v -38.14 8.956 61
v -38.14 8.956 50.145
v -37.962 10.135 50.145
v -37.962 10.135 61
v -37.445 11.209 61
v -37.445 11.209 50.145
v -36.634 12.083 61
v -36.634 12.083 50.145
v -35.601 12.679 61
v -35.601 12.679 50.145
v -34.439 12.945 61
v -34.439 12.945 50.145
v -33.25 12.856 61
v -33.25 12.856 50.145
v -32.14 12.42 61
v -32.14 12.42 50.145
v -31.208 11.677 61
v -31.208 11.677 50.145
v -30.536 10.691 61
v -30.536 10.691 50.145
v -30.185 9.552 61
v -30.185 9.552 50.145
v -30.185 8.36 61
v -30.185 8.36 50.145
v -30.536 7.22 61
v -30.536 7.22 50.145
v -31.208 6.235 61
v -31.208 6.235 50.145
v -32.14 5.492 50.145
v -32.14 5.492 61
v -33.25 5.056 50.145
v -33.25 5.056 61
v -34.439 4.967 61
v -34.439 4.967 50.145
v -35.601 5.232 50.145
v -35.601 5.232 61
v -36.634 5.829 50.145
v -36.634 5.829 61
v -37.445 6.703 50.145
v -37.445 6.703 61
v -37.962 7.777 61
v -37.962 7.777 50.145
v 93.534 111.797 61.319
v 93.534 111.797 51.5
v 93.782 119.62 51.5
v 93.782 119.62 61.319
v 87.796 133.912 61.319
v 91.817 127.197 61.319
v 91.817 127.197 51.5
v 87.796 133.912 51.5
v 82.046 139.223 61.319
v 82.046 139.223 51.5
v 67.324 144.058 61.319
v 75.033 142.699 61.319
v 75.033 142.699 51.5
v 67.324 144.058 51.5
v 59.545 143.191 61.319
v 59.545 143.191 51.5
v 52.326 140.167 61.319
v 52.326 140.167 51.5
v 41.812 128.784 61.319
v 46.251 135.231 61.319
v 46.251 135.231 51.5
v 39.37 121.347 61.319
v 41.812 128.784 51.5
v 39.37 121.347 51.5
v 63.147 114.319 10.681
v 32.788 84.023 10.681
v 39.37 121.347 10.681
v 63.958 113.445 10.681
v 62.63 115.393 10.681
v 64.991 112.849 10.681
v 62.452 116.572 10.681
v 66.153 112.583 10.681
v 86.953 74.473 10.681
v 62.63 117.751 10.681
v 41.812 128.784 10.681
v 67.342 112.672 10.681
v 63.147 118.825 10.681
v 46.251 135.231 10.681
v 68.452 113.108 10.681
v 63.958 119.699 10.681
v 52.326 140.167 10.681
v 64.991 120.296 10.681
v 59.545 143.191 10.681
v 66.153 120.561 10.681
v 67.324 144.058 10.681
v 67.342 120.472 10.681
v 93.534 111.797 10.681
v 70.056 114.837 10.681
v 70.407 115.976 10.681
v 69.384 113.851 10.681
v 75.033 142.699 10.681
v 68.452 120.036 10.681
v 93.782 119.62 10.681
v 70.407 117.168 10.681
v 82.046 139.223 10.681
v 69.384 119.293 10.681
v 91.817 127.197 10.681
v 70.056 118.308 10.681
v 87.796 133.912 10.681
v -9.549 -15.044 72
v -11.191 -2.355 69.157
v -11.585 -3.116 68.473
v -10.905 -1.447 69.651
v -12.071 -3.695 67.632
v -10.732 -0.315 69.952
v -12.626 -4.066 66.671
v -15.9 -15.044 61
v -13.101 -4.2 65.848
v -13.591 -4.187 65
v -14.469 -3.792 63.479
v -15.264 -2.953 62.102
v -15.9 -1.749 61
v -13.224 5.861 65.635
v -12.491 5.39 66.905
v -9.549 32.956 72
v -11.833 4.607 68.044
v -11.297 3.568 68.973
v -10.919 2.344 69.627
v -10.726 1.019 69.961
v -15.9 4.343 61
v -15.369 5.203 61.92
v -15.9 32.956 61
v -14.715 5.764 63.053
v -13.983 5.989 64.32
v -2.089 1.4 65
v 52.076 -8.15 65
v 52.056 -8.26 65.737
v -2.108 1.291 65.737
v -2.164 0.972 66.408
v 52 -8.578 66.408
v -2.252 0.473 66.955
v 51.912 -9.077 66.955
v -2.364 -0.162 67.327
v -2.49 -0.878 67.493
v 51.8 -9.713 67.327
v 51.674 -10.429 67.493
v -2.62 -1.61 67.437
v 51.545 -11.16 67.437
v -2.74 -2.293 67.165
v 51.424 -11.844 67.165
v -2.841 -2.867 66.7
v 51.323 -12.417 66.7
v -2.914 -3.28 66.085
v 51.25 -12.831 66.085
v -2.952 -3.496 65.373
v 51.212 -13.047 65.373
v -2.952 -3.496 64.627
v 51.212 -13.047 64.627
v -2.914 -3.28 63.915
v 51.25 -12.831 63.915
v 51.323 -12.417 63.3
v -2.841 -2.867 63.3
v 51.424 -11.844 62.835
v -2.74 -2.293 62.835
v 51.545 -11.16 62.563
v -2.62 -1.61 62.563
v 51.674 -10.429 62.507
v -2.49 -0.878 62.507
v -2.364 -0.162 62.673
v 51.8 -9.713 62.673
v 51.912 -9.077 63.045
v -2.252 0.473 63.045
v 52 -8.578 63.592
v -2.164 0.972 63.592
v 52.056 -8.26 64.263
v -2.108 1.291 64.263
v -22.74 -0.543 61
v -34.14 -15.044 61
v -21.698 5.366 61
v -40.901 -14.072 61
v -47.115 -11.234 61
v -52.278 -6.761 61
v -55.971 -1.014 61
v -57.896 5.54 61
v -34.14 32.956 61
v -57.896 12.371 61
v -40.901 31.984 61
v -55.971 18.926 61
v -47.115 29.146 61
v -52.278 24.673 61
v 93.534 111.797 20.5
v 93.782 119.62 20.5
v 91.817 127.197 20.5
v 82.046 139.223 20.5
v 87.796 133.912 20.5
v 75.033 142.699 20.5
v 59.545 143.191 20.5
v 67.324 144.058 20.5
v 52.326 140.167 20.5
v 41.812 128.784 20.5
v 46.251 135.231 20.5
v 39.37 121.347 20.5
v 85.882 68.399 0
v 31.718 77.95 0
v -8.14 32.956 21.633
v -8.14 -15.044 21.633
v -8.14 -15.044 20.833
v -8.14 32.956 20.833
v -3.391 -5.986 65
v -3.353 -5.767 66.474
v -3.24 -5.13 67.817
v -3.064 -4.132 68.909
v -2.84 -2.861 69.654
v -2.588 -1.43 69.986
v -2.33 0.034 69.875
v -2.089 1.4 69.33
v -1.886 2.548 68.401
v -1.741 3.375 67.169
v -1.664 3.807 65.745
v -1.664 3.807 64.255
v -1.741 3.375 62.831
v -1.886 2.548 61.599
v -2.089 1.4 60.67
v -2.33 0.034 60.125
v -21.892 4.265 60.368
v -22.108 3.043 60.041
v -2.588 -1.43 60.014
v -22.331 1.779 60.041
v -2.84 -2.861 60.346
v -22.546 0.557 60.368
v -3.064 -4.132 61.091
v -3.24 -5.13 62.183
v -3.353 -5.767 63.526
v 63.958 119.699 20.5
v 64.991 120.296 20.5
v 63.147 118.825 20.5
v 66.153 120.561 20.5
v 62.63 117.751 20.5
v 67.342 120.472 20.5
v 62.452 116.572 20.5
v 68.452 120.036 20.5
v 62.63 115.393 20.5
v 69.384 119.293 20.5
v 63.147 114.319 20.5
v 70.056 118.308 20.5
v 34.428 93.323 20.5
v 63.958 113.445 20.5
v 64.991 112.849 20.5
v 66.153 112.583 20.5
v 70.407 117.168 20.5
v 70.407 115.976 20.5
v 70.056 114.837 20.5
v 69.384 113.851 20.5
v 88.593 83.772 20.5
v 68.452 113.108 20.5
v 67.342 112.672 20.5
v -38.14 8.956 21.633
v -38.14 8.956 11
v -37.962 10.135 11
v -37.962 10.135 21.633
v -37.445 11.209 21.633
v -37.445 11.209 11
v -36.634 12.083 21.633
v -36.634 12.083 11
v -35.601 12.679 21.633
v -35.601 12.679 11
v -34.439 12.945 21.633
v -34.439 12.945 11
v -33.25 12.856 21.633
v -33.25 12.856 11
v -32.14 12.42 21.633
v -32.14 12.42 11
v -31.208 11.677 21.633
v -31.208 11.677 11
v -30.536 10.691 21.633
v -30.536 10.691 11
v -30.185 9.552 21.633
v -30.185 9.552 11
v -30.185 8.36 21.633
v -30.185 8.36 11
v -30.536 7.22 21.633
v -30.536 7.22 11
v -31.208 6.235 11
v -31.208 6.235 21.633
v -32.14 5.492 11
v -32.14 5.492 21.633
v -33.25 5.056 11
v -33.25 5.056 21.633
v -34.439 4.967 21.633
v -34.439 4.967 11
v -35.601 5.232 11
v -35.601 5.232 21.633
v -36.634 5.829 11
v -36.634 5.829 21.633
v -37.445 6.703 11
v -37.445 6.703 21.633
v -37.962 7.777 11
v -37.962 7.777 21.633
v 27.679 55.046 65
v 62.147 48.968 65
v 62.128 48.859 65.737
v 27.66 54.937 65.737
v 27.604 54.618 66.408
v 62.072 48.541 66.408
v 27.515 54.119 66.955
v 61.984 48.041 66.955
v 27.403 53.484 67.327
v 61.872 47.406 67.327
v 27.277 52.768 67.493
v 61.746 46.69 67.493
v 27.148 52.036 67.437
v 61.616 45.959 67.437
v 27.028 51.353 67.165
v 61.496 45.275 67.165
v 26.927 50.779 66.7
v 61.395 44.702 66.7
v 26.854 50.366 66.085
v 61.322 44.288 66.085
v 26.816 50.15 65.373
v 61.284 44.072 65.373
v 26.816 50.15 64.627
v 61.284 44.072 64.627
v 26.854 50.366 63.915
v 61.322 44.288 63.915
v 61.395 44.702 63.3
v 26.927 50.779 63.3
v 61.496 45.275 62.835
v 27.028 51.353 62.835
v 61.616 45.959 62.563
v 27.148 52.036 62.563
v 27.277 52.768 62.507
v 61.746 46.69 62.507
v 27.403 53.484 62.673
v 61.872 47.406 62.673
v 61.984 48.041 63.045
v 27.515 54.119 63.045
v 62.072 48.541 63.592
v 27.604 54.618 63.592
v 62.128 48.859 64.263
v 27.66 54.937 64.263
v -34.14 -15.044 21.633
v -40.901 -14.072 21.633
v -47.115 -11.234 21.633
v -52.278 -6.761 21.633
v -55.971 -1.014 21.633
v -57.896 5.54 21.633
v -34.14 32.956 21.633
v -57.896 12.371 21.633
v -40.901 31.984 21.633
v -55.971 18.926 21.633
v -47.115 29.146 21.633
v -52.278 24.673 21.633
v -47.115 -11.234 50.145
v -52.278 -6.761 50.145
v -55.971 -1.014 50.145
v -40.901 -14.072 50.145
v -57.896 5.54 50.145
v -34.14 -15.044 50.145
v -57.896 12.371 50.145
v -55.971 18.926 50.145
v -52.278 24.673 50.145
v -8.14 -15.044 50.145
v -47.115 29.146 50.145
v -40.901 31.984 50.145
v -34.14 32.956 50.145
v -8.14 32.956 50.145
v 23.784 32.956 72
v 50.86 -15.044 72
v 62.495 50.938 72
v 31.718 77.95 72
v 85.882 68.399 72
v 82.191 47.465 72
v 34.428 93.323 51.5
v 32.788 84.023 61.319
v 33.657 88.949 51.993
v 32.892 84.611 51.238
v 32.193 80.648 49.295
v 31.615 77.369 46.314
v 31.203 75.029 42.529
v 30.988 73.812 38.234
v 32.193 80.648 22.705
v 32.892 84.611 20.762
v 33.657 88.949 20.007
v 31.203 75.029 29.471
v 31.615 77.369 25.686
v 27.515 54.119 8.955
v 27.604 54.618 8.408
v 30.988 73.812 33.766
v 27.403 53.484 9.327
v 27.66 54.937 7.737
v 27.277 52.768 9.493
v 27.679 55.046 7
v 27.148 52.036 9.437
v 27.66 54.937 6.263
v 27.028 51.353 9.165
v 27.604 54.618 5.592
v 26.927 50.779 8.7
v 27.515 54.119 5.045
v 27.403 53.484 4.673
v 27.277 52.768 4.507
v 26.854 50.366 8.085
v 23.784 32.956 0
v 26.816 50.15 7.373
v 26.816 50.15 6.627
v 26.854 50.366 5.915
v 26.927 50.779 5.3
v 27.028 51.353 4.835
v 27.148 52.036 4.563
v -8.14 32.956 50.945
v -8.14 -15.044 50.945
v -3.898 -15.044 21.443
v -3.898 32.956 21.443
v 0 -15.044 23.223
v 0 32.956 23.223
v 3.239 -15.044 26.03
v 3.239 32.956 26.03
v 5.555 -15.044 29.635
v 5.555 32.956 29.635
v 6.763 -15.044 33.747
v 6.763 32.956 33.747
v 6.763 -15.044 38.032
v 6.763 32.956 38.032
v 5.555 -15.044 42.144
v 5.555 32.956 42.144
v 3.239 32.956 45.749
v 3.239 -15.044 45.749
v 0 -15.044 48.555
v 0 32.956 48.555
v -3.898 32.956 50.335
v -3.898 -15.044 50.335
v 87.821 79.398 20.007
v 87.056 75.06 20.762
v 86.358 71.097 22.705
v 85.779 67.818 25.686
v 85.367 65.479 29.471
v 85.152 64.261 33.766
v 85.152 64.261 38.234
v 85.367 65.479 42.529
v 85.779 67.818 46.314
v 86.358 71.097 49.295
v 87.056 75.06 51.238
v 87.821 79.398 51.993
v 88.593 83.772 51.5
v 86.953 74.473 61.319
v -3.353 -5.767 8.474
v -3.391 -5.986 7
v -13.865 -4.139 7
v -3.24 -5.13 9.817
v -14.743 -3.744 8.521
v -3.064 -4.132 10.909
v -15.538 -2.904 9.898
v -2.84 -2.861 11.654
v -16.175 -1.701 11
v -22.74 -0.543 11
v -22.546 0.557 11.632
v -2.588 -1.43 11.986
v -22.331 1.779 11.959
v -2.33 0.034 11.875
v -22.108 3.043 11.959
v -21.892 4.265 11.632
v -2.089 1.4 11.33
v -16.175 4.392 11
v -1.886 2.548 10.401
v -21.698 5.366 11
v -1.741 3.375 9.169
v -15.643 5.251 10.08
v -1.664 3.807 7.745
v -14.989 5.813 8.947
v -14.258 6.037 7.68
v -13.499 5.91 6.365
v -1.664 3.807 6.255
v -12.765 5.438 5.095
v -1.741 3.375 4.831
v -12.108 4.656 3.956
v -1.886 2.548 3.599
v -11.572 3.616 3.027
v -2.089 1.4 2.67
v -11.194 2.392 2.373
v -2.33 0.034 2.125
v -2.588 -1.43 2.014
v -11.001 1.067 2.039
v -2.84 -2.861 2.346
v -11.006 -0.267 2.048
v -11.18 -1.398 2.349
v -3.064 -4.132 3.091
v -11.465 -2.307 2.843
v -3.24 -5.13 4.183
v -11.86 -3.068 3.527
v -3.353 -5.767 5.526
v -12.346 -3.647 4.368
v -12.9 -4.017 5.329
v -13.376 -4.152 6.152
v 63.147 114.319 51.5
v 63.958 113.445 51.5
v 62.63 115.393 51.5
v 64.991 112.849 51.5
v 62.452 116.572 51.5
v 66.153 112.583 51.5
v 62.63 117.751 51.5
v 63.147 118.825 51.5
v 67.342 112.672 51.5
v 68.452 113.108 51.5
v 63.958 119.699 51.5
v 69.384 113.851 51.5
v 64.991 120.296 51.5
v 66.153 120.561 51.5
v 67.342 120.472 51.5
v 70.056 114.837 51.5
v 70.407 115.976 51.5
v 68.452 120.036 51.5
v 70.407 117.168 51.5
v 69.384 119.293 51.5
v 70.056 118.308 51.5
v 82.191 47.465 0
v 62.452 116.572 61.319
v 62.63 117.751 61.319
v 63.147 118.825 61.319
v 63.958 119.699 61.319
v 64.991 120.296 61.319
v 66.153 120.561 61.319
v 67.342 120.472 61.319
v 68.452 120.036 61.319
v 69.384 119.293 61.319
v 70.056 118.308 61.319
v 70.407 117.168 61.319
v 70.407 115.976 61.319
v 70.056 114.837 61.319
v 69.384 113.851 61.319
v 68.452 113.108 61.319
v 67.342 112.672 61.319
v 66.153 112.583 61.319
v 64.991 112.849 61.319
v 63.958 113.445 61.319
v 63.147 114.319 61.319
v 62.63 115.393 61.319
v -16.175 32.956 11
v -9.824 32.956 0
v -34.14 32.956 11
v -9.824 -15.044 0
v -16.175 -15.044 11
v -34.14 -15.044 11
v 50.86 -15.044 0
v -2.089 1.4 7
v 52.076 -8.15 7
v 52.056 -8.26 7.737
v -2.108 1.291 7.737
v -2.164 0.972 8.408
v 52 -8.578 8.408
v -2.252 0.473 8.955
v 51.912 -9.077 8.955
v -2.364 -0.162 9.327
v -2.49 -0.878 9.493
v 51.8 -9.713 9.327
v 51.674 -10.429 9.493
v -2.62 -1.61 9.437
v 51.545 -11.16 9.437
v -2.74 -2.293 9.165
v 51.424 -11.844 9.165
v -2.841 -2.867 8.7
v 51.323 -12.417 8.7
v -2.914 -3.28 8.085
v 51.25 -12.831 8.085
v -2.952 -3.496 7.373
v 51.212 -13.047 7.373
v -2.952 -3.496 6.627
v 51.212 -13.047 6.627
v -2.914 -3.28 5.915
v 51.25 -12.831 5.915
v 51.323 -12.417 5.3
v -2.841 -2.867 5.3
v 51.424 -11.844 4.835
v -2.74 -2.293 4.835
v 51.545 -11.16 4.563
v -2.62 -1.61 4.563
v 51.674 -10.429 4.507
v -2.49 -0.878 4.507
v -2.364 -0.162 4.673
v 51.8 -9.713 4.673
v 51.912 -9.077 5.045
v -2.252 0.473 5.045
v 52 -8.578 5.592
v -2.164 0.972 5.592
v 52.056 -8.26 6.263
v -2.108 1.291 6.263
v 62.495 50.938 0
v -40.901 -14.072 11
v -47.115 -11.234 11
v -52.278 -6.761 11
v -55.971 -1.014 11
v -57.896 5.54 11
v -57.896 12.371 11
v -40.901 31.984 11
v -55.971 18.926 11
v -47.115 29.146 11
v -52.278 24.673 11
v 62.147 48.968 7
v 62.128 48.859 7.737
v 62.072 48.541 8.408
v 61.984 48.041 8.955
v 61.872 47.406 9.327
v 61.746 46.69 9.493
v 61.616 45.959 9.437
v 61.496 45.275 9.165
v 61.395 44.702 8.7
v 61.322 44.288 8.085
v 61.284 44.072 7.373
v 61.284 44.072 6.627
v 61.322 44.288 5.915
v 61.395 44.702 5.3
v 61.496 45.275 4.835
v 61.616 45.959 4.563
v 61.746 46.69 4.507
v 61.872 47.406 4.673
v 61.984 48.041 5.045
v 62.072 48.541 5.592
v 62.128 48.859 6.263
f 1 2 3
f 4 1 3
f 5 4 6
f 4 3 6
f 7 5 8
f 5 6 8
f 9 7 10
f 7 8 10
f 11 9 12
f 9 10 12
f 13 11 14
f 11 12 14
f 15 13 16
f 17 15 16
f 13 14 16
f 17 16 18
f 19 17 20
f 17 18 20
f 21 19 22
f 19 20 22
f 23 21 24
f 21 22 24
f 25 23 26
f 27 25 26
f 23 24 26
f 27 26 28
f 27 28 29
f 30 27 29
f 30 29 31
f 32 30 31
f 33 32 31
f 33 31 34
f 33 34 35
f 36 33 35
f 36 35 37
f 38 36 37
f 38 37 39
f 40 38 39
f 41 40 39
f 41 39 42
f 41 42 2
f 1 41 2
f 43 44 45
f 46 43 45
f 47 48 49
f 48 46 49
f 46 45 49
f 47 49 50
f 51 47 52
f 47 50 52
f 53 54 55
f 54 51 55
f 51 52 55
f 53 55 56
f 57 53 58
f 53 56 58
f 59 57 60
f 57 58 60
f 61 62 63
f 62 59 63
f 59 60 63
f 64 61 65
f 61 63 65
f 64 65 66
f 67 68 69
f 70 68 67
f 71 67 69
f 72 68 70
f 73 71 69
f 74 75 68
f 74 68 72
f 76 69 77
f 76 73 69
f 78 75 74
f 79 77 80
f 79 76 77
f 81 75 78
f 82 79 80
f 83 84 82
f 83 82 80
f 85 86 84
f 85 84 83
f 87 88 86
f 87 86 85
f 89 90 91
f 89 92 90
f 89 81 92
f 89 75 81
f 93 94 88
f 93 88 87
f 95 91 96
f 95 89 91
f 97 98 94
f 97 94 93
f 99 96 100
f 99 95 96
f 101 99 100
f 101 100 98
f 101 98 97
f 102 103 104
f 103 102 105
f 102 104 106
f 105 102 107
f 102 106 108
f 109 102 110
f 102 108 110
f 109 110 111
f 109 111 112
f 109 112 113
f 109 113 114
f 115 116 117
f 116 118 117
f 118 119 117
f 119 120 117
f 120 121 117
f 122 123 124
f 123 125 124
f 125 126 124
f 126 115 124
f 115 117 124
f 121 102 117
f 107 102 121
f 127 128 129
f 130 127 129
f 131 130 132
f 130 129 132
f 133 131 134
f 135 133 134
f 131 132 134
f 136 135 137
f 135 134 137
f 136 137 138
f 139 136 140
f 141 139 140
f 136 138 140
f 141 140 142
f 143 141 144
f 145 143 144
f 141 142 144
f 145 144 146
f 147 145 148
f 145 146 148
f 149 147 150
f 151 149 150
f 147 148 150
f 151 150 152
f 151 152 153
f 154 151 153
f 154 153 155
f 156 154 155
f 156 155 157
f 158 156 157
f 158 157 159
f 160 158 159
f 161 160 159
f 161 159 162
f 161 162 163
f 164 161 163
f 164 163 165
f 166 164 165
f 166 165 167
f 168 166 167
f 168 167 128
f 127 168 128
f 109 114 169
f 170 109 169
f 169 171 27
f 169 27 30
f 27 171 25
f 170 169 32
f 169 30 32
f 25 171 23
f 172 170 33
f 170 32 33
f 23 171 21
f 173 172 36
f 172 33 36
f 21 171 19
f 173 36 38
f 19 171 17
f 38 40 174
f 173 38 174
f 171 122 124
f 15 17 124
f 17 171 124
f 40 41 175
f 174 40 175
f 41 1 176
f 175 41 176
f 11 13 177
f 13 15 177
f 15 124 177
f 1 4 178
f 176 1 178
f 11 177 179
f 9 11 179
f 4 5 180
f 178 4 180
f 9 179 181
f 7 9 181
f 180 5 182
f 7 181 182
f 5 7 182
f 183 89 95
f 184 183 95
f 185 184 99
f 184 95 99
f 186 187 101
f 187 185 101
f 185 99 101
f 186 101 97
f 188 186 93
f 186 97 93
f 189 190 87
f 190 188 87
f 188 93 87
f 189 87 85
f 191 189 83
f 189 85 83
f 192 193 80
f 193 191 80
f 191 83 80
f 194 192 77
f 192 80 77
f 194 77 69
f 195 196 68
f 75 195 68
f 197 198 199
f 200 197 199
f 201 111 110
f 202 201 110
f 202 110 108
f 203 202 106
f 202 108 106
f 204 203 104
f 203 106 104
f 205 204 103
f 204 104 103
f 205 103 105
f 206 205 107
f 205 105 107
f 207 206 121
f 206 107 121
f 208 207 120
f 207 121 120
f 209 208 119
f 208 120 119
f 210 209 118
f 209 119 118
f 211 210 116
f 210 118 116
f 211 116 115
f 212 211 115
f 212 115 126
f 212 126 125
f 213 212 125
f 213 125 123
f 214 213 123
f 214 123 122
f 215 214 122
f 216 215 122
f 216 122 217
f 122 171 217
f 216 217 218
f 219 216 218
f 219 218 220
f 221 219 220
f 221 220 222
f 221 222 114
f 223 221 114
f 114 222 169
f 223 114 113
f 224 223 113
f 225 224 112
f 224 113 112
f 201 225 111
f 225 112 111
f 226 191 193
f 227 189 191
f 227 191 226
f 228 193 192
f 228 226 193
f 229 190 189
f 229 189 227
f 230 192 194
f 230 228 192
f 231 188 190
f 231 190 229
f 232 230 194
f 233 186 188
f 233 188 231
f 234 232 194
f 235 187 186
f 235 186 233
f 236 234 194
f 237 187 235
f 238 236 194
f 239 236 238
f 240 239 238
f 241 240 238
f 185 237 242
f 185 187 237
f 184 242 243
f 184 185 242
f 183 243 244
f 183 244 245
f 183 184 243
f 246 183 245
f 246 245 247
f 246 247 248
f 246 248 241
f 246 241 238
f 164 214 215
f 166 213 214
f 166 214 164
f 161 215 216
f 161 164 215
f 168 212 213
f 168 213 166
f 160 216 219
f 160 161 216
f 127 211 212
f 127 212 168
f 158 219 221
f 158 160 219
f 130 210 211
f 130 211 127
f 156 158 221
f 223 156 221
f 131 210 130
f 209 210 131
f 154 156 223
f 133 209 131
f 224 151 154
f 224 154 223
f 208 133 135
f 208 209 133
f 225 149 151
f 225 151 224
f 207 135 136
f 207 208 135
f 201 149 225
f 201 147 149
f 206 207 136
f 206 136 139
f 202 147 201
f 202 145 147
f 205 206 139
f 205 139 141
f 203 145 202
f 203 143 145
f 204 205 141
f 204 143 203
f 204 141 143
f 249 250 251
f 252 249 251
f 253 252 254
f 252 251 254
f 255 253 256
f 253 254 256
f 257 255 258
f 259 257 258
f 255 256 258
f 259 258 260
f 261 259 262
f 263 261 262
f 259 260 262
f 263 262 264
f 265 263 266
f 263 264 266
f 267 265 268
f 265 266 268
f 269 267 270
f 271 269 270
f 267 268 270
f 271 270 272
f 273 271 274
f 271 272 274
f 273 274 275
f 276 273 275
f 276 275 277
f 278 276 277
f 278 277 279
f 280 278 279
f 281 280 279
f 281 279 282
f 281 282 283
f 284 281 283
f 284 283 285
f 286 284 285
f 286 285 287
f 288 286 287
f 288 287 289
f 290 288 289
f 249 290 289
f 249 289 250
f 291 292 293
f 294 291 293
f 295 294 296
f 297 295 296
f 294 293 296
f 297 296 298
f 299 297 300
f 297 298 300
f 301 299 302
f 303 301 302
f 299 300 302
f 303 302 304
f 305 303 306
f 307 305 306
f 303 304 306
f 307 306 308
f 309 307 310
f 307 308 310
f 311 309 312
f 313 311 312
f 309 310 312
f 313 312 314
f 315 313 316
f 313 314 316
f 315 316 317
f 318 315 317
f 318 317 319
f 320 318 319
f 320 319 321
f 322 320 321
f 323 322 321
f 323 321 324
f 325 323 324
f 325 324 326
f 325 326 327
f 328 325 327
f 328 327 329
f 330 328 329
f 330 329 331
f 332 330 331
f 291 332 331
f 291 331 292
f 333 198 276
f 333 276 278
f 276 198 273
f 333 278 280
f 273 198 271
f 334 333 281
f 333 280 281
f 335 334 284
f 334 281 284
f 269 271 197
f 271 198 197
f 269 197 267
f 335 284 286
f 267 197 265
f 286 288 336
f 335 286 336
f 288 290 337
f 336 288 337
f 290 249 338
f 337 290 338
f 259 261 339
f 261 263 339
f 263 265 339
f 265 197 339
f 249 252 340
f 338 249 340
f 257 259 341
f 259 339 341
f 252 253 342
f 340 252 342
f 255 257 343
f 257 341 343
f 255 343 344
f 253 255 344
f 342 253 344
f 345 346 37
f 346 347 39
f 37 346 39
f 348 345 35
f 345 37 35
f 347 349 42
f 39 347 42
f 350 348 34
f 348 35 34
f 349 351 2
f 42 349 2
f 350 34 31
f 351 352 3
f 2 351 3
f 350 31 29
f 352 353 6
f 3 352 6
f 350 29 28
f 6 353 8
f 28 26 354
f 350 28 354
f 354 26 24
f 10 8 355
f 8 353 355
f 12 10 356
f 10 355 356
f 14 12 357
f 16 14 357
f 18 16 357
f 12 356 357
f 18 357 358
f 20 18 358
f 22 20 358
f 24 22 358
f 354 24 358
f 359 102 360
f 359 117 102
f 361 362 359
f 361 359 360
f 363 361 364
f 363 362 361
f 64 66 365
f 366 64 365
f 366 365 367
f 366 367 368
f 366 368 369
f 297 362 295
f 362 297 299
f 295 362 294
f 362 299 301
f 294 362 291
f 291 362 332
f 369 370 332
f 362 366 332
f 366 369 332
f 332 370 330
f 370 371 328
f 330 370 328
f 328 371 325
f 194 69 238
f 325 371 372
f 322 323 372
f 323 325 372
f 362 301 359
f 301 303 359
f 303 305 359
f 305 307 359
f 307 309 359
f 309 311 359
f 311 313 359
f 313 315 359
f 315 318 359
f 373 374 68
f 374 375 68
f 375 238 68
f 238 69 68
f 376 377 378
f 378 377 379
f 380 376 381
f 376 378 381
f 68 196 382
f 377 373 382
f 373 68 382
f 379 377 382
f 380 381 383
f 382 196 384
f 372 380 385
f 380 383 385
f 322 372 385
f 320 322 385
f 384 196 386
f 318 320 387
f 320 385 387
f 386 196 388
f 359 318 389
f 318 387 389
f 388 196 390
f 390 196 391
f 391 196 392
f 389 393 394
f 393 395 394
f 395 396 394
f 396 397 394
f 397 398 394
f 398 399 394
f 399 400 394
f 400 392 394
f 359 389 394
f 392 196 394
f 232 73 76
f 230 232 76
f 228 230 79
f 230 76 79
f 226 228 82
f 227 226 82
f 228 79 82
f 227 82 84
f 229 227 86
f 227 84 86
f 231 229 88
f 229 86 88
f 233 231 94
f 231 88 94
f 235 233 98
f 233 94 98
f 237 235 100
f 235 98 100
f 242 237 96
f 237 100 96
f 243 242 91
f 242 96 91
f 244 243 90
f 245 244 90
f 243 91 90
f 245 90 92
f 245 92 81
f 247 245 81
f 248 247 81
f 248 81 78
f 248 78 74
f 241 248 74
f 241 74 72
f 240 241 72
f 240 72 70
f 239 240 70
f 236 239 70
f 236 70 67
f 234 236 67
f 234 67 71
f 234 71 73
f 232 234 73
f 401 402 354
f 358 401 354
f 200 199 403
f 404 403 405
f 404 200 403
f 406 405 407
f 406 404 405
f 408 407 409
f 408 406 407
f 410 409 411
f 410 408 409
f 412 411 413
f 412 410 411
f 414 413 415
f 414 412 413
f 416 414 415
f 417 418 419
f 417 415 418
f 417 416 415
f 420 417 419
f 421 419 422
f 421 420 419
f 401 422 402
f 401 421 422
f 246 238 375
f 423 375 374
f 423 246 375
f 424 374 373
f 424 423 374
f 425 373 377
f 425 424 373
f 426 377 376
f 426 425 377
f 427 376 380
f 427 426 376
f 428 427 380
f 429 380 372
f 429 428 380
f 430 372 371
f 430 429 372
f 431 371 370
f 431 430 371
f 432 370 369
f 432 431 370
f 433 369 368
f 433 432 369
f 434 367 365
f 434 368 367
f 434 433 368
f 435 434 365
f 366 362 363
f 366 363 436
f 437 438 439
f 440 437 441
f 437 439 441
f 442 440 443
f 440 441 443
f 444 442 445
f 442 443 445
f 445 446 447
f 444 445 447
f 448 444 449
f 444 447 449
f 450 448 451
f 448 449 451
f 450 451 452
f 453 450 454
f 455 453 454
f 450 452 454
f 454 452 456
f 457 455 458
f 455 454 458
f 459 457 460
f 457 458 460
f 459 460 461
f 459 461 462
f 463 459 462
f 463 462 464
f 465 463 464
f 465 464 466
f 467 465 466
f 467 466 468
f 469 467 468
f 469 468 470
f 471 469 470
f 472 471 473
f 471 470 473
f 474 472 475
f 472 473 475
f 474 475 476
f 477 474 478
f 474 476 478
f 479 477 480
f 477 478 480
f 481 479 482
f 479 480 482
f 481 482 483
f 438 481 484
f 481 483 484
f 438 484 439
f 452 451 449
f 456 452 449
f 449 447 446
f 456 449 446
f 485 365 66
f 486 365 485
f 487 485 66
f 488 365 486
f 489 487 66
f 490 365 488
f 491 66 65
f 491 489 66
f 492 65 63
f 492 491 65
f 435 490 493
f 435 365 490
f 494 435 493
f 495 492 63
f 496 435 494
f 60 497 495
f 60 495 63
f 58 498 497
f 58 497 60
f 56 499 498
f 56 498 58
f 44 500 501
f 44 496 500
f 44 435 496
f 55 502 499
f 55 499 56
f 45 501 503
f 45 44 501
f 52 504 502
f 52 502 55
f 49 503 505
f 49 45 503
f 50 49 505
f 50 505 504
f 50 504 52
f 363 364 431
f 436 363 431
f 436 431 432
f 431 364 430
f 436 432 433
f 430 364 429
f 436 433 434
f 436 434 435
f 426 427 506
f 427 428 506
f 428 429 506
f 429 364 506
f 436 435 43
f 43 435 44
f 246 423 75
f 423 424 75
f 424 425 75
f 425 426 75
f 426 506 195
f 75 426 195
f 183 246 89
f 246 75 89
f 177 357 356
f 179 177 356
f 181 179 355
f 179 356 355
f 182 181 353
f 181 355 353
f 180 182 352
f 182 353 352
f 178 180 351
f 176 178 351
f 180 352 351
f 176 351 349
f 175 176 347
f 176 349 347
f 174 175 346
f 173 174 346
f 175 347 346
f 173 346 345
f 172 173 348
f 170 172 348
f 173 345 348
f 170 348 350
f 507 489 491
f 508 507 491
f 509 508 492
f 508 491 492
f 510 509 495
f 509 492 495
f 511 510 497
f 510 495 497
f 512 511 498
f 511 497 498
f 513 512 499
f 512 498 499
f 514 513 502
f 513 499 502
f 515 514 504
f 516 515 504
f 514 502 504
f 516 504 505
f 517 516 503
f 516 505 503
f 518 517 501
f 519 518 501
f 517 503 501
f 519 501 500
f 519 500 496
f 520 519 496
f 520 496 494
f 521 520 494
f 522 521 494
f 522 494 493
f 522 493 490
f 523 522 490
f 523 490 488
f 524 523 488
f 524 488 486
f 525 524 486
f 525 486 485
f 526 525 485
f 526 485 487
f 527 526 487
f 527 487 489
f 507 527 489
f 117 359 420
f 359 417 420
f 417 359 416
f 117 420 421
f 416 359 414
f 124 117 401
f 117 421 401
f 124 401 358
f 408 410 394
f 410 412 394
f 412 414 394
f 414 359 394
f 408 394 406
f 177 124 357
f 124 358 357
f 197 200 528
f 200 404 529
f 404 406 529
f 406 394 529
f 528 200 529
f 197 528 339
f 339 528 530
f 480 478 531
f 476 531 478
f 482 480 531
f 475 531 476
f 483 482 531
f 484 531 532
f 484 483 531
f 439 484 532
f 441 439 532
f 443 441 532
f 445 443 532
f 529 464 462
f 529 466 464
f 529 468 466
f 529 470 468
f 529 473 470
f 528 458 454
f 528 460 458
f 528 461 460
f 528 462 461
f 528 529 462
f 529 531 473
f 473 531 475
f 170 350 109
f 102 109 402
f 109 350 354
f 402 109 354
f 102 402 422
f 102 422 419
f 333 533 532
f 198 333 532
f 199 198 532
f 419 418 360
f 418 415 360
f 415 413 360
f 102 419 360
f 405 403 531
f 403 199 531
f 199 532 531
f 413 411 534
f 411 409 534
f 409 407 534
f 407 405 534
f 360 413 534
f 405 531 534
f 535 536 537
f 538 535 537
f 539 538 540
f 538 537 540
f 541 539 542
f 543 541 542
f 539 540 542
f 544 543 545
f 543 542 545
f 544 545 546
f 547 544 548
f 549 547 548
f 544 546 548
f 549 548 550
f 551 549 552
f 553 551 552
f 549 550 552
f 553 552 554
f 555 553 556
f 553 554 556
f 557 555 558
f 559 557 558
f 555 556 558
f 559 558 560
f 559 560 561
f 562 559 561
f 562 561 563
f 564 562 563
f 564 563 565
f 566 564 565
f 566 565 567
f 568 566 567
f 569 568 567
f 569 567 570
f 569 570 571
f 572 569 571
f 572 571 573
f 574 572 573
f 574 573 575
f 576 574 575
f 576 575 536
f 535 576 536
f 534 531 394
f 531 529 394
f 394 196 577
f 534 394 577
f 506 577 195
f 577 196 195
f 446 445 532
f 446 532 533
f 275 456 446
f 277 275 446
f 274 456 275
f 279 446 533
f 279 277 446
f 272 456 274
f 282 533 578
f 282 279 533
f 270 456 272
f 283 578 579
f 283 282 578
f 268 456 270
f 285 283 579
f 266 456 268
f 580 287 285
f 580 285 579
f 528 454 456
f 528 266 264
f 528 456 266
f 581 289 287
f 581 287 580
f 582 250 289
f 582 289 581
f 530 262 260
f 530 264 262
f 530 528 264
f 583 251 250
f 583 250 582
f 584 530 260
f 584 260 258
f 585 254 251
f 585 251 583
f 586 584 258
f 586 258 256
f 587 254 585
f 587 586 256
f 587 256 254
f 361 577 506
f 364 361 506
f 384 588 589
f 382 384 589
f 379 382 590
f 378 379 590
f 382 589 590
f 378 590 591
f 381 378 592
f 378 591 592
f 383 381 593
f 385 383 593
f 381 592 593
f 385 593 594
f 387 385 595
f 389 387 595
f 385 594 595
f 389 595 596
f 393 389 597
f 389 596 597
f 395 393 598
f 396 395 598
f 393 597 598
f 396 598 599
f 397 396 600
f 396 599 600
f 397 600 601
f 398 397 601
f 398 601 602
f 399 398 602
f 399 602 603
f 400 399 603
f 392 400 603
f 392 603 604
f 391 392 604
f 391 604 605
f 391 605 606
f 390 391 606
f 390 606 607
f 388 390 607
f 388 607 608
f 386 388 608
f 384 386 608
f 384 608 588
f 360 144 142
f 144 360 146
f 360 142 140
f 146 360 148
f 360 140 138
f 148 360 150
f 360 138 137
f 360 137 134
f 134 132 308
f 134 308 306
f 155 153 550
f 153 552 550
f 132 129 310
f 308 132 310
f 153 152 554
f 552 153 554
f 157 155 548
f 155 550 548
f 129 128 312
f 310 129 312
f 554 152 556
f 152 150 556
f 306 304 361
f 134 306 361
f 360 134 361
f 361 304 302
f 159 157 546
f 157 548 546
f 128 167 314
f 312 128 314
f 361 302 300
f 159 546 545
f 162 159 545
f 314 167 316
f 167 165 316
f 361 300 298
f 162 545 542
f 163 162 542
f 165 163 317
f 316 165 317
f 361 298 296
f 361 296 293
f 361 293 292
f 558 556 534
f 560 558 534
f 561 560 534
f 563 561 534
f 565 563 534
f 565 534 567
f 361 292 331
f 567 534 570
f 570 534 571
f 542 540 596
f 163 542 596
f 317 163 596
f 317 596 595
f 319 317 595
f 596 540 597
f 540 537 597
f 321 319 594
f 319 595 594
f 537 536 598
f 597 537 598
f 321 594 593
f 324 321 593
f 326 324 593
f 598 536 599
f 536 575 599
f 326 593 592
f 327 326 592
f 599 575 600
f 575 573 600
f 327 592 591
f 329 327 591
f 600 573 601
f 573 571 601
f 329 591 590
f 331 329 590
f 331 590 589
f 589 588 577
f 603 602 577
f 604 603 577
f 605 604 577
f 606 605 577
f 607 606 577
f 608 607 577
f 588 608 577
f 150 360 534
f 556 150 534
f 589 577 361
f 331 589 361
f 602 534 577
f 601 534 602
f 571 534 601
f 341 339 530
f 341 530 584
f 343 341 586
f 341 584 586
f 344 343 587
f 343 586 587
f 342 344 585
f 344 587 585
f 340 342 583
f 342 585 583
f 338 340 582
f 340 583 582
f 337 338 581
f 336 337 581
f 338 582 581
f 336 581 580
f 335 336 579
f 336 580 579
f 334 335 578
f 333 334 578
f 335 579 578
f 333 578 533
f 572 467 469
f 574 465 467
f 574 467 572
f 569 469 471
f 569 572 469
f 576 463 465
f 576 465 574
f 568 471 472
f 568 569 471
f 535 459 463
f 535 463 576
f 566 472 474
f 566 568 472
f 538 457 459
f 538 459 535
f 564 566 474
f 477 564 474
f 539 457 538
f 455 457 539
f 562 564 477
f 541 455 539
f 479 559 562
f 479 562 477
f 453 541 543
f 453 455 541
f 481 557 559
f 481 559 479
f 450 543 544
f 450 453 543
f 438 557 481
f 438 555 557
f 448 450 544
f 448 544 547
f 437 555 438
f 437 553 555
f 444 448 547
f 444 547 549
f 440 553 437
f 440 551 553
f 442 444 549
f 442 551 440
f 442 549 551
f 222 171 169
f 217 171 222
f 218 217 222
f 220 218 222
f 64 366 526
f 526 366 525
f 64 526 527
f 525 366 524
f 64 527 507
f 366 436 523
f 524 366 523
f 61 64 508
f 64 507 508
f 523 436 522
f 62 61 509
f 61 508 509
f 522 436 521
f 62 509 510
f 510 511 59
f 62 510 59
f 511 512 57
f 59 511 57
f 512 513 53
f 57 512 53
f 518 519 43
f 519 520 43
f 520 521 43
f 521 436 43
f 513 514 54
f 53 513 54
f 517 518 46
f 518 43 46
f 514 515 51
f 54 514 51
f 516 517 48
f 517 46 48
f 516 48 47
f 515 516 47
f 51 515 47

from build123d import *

# Parameters (mm, degrees)
BOSS_EXTRUDE1_DEPTH = 72
CUT_EXTRUDE1_DEPTH  = 72
SKETCH4_W           = 26
SKETCH4_H           = 28.511973983
SKETCH4_W_2         = 24
CUT_EXTRUDE2_DEPTH  = 72
CUT_EXTRUDE3_DEPTH  = 72
CUT_EXTRUDE4_DEPTH  = 72
SKETCH10_R          = 4
CUT_EXTRUDE5_DEPTH  = 72
SKETCH9_R           = 4
CUT_EXTRUDE6_DEPTH  = 72
SKETCH11_R          = 2.5
CUT_EXTRUDE7_DEPTH  = 100
SKETCH15_R          = 5
CUT_EXTRUDE9_DEPTH  = 20


# Read off the part's stored shape, not the designer's step: Boss-Extrude1
with BuildPart() as part:
    # Boss-Extrude1 outline → Boss-Extrude1 (new body)
    with BuildSketch(Plane.XY):
        with BuildLine():
            Line((62.494511824, 50.937989443), (82.190666884, 47.46502589))
            Line((82.190666884, 47.46502589), (93.534081641, 111.796727777))
            ThreePointArc((93.534081641, 111.796727777), (71.22719332, 143.654265871), (39.369655226, 121.347377549))
            Line((39.369655226, 121.347377549), (23.783847578, 32.955869992))
            Line((23.783847578, 32.955869992), (-34.13991608, 32.955869992))
            ThreePointArc((-34.13991608, 32.955869992), (-58.13991608, 8.955869992), (-34.13991608, -15.044130008))
            Line((-34.13991608, -15.044130008), (50.86008392, -15.044130008))
            Line((50.86008392, -15.044130008), (62.494511824, 50.937989443))
        make_face()
    extrude(amount=BOSS_EXTRUDE1_DEPTH)

    # Sketch3 → Cut-Extrude1 (cut)
    with BuildSketch(Plane(origin=(0, 32.955869992, 0), x_dir=(1, 0, 0), z_dir=(0, 1, 0))):
        Polygon((-9.823766264, 0), (-16.174619225, -11), (-58.13991608, -11), (-58.13991608, 0), align=None)
        Polygon((-9.54918364, -72), (-15.900036601, -61), (-58.13991608, -61), (-58.13991608, -72), align=None)
    extrude(amount=-CUT_EXTRUDE1_DEPTH, mode=Mode.SUBTRACT)

    # Sketch4 → Cut-Extrude2 (cut)
    with BuildSketch(Plane(origin=(0, 32.955869992, 0), x_dir=(1, 0, 0), z_dir=(0, 1, 0))):
        with Locations((-21.13991608, -35.889301659)):
            Rectangle(SKETCH4_W, SKETCH4_H)
        with Locations((-46.13991608, -35.889301659)):
            Rectangle(SKETCH4_W_2, SKETCH4_H)
        with BuildLine():
            ThreePointArc((-8.13991608, -20.833314667), (6.916070911, -35.889301658), (-8.13991608, -50.94528865))
            Line((-8.13991608, -50.94528865), (-8.13991608, -20.833314667))
        make_face()
    extrude(amount=-CUT_EXTRUDE2_DEPTH, mode=Mode.SUBTRACT)

    # Sketch5 → Cut-Extrude3 (cut)
    with BuildSketch(Plane(origin=(71.595317547, -12.624186176, 0), x_dir=(0, 0, -1), z_dir=(0.9848077530122087, -0.173648177666927, 0))):
        Polygon((-72, 82.273588595), (-61.318633323, 88.440478521), (-61.318633323, 153.840307103), (-72, 153.840307103), align=None)
        Polygon((0, 82.273588595), (-10.681366677, 88.440478521), (-10.681366677, 153.840307103), (0, 153.840307103), align=None)
    extrude(amount=-CUT_EXTRUDE3_DEPTH, mode=Mode.SUBTRACT)

    # Sketch7 → Cut-Extrude4 (cut)
    with BuildSketch(Plane(origin=(71.595317547, -12.624186176, 0), x_dir=(0, 0, -1), z_dir=(0.9848077530122087, -0.173648177666927, 0))):
        with BuildLine():
            Line((-51.5, 97.883463974), (-51.5, 153.840307103))
            Line((-51.5, 153.840307103), (-20.5, 153.840307103))
            Line((-20.5, 153.840307103), (-20.5, 97.883463974))
            ThreePointArc((-20.5, 97.883463974), (-36, 77.914837007), (-51.5, 97.883463974))
        make_face()
    extrude(amount=-CUT_EXTRUDE4_DEPTH, mode=Mode.SUBTRACT)

    # Sketch10 → Cut-Extrude5 (cut)
    with BuildSketch(Plane(origin=(0, 0, 10.681366677), x_dir=(-1, 0, 0), z_dir=(0, 0, -1))):
        with Locations((-66.451868434, 116.572052663)):
            Circle(SKETCH10_R)
    extrude(amount=-CUT_EXTRUDE5_DEPTH, mode=Mode.SUBTRACT)

    # Sketch9 → Cut-Extrude6 (cut)
    with BuildSketch(Plane(origin=(0, 0, 11), x_dir=(-1, 0, 0), z_dir=(0, 0, -1))):
        with Locations((34.13991608, 8.955869992)):
            Circle(SKETCH9_R)
    extrude(amount=-CUT_EXTRUDE6_DEPTH, mode=Mode.SUBTRACT)

    # Sketch11 → Cut-Extrude7 (cut)
    with BuildSketch(Plane(origin=(51.899162487, -9.151222623, 0), x_dir=(0, 0, -1), z_dir=(0.9848077530122088, -0.17364817766692606, 0))):
        with Locations(Location((-7, -1.483814981, 0), (0, 0, 90))):
            Circle(SKETCH11_R)
        with Locations(Location((-65, -1.483814981, 0), (0, 0, 90))):
            Circle(SKETCH11_R)
        with Locations(Location((-7, 56.516185019, 0), (0, 0, 90))):
            Circle(SKETCH11_R)
        with Locations(Location((-65, 56.516185019, 0), (0, 0, 90))):
            Circle(SKETCH11_R)
    extrude(amount=-CUT_EXTRUDE7_DEPTH, mode=Mode.SUBTRACT)

    # Sketch15 → Cut-Extrude9 (cut)
    with BuildSketch(Plane(origin=(-21.961418989, 3.872390702, 0), x_dir=(0, 0, 1), z_dir=(-0.9848077530122088, 0.17364817766692614, 0))):
        with Locations(Location((7, -1.483814981, 0), (0, 0, 270))):
            Circle(SKETCH15_R)
        with Locations(Location((65, -1.483814981, 0), (0, 0, 270))):
            Circle(SKETCH15_R)
    extrude(amount=-CUT_EXTRUDE9_DEPTH, mode=Mode.SUBTRACT)


solid = part.part
